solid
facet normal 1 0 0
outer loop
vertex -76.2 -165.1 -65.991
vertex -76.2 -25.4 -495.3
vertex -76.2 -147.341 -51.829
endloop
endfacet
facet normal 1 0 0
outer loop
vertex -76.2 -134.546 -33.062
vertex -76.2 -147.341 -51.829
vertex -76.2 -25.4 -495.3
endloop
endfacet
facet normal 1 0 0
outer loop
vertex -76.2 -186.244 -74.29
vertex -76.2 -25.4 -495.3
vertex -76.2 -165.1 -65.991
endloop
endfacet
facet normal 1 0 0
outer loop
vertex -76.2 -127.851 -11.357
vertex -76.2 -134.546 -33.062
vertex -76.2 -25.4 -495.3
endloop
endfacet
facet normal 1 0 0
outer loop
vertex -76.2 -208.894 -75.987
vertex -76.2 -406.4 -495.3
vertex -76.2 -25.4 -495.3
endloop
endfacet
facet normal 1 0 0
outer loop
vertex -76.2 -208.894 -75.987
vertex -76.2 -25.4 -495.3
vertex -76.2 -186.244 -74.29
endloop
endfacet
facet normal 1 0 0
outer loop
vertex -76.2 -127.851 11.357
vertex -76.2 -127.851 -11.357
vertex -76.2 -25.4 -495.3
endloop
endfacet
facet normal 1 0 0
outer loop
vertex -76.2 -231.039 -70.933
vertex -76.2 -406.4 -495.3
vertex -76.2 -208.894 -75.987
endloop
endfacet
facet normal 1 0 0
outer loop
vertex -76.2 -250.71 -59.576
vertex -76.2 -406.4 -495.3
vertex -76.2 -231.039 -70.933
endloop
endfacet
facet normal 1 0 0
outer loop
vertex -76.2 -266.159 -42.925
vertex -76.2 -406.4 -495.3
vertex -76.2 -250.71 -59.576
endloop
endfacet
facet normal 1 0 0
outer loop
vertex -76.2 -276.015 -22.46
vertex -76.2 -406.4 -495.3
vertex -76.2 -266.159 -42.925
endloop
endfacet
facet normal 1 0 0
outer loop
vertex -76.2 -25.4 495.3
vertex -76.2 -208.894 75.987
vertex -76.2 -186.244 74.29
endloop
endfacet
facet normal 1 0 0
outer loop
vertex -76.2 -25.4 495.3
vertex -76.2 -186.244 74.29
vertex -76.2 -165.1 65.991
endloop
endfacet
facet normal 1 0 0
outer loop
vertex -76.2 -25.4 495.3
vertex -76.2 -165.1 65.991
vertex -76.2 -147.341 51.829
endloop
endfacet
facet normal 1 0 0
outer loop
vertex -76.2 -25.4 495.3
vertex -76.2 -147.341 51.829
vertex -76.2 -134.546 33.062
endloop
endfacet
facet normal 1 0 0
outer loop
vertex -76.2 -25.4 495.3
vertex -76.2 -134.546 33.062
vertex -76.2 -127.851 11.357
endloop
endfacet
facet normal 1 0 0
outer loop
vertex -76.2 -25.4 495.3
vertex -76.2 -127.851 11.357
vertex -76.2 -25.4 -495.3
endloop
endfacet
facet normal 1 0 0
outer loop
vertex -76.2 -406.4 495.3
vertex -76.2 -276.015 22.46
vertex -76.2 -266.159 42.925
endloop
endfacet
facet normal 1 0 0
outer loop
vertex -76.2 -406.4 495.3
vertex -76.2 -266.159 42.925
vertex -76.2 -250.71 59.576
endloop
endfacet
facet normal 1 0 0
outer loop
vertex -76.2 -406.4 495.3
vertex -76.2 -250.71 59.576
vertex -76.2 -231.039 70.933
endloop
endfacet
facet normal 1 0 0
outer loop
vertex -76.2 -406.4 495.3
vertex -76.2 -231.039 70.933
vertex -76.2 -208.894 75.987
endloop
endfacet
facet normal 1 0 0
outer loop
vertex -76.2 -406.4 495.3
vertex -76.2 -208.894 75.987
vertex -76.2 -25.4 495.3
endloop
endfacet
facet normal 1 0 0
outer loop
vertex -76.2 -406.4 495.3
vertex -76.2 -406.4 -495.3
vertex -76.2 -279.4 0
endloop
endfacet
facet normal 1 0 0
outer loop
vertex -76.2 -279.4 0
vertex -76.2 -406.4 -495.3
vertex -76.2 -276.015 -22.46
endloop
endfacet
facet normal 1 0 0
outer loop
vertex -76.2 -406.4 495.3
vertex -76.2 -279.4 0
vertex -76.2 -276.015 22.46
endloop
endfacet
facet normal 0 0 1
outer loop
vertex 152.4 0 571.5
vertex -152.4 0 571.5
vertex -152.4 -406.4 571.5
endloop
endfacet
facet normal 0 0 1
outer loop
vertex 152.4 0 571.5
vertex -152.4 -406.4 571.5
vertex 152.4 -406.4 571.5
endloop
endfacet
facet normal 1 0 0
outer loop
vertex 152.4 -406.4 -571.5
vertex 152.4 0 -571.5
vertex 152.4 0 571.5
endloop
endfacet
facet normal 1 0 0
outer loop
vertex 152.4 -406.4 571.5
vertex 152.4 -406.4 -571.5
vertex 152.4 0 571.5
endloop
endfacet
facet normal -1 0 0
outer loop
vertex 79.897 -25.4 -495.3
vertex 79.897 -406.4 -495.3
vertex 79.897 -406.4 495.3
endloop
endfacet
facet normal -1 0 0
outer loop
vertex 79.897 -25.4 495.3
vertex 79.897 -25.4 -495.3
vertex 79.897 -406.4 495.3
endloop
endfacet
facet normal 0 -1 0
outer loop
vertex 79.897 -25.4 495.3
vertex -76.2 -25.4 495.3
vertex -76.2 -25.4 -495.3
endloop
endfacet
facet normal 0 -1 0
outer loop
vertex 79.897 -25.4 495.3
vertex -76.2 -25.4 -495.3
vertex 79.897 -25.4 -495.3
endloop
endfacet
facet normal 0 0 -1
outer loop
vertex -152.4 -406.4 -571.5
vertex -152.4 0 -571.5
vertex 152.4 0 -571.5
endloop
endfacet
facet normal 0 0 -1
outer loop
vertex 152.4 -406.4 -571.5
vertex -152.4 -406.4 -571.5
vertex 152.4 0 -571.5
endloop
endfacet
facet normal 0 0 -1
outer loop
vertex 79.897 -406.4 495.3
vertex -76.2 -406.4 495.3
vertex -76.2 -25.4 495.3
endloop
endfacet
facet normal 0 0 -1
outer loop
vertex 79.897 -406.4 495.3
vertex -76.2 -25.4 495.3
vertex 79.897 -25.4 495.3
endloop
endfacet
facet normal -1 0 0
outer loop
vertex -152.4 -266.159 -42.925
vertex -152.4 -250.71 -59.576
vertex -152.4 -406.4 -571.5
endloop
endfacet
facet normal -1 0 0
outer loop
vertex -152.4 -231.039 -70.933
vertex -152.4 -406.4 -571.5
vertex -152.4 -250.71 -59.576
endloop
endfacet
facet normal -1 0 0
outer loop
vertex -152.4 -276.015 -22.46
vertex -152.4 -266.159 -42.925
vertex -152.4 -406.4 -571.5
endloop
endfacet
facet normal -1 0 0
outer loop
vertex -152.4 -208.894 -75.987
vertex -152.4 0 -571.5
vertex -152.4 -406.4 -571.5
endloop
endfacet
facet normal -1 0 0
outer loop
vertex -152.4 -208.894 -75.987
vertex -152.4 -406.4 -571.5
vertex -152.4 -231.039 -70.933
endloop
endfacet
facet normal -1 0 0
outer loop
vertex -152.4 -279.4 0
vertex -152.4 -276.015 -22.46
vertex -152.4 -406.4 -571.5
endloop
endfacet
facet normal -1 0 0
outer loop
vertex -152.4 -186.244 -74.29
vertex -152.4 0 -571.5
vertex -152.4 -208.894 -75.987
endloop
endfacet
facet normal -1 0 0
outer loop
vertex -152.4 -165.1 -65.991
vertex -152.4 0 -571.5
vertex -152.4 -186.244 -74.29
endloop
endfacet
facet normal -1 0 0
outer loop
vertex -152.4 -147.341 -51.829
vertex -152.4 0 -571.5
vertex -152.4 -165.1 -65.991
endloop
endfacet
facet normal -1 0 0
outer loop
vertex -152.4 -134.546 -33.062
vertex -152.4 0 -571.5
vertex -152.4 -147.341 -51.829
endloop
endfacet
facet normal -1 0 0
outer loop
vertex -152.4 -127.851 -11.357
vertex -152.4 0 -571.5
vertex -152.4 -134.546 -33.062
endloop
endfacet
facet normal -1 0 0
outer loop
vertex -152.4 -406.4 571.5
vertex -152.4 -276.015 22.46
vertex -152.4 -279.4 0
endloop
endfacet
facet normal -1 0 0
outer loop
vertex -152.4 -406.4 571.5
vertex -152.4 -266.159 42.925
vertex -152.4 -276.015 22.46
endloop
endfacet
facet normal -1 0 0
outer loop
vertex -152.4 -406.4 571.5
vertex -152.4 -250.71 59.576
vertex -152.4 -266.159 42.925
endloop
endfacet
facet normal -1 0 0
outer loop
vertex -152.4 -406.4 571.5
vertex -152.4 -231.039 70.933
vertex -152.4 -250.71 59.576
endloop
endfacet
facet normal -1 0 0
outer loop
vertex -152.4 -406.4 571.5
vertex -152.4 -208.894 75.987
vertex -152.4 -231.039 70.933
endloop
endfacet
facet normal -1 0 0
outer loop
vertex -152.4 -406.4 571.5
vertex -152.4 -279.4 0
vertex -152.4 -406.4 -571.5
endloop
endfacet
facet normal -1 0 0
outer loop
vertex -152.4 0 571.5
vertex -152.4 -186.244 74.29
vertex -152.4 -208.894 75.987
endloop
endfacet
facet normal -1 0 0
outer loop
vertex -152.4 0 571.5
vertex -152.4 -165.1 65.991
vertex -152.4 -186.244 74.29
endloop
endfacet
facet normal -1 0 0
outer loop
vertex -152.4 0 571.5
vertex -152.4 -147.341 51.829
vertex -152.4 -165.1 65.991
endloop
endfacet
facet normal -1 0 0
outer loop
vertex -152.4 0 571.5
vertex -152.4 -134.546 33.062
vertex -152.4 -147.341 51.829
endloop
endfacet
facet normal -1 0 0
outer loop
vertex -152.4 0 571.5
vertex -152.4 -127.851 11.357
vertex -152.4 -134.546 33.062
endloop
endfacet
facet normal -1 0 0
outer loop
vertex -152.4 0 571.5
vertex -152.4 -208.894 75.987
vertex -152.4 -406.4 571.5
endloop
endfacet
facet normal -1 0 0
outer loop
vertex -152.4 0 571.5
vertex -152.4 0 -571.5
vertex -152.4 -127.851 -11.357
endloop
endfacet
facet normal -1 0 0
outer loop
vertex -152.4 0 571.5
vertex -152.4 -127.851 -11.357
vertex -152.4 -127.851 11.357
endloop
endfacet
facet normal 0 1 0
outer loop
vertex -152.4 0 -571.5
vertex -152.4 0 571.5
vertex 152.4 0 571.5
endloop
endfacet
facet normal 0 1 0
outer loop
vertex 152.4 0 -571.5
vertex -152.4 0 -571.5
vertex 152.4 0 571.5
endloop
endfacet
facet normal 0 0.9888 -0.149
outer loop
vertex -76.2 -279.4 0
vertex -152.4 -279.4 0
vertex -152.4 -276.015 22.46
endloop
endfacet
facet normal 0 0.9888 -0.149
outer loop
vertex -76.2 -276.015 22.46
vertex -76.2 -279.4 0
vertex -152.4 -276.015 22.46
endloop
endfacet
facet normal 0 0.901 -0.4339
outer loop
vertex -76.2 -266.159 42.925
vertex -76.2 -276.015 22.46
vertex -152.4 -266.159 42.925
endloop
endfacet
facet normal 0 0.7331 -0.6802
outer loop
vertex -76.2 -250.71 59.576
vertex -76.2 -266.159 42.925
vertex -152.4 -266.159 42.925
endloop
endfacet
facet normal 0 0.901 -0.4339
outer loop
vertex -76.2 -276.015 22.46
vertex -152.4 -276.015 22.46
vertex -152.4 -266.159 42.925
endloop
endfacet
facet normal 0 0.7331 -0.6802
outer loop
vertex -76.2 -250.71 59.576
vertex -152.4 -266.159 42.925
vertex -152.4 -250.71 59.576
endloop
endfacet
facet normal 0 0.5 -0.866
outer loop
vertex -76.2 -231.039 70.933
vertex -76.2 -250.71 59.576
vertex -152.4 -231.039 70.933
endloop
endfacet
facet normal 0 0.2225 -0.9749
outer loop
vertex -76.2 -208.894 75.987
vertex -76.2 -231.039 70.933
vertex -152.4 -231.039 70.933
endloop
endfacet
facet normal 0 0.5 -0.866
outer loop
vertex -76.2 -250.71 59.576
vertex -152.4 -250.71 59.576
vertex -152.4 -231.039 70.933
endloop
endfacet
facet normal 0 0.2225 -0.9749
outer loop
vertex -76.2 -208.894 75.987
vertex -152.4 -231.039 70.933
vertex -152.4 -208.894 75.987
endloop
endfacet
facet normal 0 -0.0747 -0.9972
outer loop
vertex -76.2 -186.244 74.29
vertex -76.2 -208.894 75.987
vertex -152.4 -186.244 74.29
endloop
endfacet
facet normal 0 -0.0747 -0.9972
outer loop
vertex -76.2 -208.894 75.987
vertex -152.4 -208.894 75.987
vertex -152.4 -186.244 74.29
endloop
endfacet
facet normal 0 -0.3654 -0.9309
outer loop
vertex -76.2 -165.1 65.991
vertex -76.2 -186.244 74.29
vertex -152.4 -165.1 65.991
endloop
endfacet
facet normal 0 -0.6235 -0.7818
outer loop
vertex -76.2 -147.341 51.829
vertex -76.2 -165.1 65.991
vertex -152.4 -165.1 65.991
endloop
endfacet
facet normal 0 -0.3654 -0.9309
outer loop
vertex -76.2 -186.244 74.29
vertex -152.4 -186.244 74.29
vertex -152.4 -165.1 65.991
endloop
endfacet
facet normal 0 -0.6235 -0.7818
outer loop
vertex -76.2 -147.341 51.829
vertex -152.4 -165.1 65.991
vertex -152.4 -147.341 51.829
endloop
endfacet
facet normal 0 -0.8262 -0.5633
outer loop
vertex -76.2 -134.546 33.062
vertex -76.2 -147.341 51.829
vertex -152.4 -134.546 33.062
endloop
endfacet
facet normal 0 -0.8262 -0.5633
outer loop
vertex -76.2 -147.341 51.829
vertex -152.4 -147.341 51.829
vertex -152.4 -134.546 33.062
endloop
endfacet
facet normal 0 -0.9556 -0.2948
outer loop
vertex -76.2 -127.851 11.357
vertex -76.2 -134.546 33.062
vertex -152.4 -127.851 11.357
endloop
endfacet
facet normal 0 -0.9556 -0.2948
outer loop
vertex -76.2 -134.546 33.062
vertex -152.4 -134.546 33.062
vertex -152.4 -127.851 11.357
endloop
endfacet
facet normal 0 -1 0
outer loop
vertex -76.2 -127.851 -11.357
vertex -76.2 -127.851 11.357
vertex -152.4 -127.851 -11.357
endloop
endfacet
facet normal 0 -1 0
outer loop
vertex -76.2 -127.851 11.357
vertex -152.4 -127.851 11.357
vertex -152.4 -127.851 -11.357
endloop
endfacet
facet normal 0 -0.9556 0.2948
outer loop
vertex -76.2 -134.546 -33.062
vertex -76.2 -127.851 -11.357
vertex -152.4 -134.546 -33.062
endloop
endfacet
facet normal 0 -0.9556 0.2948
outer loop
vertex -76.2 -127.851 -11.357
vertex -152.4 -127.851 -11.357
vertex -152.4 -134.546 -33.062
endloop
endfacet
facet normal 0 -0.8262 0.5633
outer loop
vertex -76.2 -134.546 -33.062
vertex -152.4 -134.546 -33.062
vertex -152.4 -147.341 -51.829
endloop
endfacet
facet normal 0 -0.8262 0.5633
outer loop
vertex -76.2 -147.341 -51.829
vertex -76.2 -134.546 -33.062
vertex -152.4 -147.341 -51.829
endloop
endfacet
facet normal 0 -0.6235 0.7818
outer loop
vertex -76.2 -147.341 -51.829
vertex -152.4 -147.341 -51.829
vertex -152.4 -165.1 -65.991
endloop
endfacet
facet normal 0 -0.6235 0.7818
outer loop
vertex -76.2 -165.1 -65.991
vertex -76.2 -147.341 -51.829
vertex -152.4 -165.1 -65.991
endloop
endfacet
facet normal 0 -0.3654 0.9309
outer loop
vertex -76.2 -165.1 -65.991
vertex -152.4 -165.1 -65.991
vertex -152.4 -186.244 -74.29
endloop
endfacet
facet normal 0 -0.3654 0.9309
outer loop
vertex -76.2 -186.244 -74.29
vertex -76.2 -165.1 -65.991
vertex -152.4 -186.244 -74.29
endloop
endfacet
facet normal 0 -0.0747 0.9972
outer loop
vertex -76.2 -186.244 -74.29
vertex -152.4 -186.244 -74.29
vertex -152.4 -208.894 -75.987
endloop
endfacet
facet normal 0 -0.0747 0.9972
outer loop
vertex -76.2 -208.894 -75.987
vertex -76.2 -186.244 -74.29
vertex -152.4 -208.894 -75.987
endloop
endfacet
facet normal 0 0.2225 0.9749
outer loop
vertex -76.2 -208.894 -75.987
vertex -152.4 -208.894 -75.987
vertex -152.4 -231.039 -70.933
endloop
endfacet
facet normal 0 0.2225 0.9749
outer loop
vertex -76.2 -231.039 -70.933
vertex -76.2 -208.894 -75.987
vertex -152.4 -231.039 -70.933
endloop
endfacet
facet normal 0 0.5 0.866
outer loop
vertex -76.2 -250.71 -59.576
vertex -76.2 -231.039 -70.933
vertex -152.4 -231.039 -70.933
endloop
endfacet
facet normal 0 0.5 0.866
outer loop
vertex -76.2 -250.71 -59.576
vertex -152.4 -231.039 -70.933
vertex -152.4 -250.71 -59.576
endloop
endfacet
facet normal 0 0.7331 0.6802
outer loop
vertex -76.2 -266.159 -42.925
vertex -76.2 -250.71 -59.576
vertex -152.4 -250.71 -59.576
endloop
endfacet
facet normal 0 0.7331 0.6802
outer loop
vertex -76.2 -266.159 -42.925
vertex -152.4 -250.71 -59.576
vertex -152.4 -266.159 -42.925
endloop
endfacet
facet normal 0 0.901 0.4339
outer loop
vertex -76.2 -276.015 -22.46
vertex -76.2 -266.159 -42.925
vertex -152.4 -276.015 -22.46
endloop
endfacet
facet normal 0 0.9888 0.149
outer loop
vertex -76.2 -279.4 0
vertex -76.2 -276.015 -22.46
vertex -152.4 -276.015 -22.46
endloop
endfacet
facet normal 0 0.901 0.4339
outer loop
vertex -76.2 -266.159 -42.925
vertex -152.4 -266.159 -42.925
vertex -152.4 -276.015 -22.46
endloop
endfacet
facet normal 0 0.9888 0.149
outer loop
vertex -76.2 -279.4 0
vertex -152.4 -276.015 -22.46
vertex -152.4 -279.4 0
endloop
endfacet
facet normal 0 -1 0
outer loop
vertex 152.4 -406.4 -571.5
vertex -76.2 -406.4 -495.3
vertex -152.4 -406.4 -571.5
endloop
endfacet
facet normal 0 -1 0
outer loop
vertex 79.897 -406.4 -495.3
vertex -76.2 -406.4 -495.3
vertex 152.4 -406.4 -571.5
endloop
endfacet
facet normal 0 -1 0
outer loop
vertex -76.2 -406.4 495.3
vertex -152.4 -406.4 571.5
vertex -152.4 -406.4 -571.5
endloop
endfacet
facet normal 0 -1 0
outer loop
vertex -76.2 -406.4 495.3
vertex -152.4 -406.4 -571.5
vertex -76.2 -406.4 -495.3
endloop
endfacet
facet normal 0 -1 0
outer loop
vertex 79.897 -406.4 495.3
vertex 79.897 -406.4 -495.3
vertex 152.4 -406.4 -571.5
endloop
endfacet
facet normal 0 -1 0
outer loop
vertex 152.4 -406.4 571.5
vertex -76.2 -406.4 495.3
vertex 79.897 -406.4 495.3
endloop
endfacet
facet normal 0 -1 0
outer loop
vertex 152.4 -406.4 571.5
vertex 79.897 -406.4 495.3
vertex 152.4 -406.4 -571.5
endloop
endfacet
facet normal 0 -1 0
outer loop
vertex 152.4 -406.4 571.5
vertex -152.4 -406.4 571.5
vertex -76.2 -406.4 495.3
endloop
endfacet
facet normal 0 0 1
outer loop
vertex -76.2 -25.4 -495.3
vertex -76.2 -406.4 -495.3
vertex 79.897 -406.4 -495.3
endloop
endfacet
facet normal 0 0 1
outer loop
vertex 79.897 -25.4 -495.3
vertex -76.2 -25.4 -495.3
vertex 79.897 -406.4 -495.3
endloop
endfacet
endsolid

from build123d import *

# Parameters (mm, degrees)
F0_W     = 304.8
F0_H     = 1143
F1_DEPTH = 406.4
F2_W     = 156.097188
F2_H     = 990.6
F3_DEPTH = 381
F4_R     = 76.2
F5_DEPTH = 76.2


with BuildPart() as f1:
    # F0 (on Front) → F1 (new body)
    with BuildSketch(Plane.XZ):
        Rectangle(F0_W, F0_H)
    extrude(amount=F1_DEPTH)

    # F2 (on face) → F3 (cut)
    with BuildSketch(Plane.XZ.offset(406.4)):
        with Locations((1.848594, 0)):
            Rectangle(F2_W, F2_H)
    extrude(amount=-F3_DEPTH, mode=Mode.SUBTRACT)

    # F4 (on face) → F5 (cut)
    with BuildSketch(Plane(origin=(-152.4, 0, 0), x_dir=(0, -1, 0), z_dir=(-1, 0, 0))):
        with Locations((203.2, 0)):
            Circle(F4_R)
    extrude(amount=-F5_DEPTH, mode=Mode.SUBTRACT)


solid = f1.part
